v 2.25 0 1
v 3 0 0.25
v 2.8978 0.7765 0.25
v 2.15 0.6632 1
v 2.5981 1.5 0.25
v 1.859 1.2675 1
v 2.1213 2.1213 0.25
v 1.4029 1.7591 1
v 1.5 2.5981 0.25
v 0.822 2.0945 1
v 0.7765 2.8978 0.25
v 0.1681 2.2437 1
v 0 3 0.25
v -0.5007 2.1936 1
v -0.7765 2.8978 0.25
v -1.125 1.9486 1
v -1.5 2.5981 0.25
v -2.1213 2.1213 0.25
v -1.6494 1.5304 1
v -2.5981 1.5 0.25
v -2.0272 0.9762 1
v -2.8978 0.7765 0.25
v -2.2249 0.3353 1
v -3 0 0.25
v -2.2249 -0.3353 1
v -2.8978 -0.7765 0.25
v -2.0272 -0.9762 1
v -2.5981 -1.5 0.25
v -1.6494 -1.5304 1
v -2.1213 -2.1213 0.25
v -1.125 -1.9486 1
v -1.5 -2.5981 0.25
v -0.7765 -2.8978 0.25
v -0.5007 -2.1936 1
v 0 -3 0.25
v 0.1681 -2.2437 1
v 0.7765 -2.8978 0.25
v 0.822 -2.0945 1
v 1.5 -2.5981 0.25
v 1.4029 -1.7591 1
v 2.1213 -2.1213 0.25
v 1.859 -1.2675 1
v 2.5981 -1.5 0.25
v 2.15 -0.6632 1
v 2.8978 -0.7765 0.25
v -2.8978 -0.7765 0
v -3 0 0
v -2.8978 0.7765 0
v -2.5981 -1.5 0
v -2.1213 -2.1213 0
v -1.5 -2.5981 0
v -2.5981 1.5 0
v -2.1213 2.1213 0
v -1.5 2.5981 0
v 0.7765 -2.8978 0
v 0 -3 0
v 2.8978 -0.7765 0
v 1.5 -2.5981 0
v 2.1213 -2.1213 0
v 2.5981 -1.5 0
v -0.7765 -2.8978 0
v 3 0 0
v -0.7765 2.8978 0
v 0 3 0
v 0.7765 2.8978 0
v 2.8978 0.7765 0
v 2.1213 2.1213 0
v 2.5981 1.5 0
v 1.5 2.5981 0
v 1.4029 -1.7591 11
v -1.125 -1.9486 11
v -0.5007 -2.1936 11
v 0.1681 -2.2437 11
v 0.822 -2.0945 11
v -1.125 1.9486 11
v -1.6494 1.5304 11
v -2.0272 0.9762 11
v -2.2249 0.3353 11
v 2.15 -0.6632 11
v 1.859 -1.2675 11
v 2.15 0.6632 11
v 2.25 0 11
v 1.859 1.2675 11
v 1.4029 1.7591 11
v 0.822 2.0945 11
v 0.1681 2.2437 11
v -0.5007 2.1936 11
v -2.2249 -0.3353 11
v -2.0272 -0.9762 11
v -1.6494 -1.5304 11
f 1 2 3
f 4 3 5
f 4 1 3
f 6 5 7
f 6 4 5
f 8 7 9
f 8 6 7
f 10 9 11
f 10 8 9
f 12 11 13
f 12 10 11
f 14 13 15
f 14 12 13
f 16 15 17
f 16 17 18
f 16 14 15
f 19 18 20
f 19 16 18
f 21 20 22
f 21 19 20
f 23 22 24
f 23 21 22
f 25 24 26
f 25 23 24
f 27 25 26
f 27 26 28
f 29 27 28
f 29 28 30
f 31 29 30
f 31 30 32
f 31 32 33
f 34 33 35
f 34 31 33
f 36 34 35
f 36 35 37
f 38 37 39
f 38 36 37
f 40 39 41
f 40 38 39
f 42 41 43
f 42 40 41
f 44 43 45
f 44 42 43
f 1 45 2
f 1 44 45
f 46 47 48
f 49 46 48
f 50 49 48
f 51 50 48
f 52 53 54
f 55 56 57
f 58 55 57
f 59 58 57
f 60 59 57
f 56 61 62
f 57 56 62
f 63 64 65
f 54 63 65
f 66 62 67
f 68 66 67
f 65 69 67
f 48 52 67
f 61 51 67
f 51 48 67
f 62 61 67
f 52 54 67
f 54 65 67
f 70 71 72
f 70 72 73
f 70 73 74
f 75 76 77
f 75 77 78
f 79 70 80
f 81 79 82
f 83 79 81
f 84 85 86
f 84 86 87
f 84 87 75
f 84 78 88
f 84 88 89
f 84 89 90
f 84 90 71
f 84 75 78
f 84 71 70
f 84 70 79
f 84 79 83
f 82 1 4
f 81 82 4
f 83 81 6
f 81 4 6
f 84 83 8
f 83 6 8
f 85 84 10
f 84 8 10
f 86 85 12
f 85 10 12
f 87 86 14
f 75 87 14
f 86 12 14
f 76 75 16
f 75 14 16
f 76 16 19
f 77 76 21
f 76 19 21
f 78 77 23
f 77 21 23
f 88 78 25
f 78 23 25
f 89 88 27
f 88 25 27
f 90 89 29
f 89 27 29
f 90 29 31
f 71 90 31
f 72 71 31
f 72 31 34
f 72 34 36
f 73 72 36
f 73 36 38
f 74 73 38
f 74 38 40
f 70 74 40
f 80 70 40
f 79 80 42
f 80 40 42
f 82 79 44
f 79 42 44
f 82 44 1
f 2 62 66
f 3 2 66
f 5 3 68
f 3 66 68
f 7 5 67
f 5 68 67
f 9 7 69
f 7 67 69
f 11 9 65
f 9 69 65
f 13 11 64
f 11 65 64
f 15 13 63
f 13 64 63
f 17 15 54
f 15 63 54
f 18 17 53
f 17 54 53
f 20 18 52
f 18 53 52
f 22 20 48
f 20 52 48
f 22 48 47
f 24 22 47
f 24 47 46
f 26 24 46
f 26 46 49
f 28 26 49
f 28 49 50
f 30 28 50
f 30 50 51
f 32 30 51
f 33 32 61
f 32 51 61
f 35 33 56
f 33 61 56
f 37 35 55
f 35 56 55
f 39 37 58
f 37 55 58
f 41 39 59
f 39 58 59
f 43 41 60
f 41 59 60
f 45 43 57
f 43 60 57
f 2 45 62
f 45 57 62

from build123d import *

# Parameters (mm, degrees)
ESQUISSE1_R        = 3
BOSS_EXTRU_1_DEPTH = 1
CHANFREIN1_SIZE    = 0.75
ESQUISSE2_R        = 2.25
BOSS_EXTRU_2_DEPTH = 10


with BuildPart() as part:
    # Esquisse1 → Boss.-Extru.1 (new body)
    with BuildSketch(Plane.XY):
        Circle(ESQUISSE1_R)
    extrude(amount=BOSS_EXTRU_1_DEPTH)

    # Chanfrein1
    chanfrein1_edges = [part.edges().sort_by_distance(p)[0] for p in [
        (-3, 0, 1),
    ]]
    chamfer(chanfrein1_edges, length=CHANFREIN1_SIZE)

    # Esquisse2 → Boss.-Extru.2 (add)
    with BuildSketch(Plane.XY.offset(1)):
        Circle(ESQUISSE2_R)
    extrude(amount=BOSS_EXTRU_2_DEPTH)


solid = part.part
